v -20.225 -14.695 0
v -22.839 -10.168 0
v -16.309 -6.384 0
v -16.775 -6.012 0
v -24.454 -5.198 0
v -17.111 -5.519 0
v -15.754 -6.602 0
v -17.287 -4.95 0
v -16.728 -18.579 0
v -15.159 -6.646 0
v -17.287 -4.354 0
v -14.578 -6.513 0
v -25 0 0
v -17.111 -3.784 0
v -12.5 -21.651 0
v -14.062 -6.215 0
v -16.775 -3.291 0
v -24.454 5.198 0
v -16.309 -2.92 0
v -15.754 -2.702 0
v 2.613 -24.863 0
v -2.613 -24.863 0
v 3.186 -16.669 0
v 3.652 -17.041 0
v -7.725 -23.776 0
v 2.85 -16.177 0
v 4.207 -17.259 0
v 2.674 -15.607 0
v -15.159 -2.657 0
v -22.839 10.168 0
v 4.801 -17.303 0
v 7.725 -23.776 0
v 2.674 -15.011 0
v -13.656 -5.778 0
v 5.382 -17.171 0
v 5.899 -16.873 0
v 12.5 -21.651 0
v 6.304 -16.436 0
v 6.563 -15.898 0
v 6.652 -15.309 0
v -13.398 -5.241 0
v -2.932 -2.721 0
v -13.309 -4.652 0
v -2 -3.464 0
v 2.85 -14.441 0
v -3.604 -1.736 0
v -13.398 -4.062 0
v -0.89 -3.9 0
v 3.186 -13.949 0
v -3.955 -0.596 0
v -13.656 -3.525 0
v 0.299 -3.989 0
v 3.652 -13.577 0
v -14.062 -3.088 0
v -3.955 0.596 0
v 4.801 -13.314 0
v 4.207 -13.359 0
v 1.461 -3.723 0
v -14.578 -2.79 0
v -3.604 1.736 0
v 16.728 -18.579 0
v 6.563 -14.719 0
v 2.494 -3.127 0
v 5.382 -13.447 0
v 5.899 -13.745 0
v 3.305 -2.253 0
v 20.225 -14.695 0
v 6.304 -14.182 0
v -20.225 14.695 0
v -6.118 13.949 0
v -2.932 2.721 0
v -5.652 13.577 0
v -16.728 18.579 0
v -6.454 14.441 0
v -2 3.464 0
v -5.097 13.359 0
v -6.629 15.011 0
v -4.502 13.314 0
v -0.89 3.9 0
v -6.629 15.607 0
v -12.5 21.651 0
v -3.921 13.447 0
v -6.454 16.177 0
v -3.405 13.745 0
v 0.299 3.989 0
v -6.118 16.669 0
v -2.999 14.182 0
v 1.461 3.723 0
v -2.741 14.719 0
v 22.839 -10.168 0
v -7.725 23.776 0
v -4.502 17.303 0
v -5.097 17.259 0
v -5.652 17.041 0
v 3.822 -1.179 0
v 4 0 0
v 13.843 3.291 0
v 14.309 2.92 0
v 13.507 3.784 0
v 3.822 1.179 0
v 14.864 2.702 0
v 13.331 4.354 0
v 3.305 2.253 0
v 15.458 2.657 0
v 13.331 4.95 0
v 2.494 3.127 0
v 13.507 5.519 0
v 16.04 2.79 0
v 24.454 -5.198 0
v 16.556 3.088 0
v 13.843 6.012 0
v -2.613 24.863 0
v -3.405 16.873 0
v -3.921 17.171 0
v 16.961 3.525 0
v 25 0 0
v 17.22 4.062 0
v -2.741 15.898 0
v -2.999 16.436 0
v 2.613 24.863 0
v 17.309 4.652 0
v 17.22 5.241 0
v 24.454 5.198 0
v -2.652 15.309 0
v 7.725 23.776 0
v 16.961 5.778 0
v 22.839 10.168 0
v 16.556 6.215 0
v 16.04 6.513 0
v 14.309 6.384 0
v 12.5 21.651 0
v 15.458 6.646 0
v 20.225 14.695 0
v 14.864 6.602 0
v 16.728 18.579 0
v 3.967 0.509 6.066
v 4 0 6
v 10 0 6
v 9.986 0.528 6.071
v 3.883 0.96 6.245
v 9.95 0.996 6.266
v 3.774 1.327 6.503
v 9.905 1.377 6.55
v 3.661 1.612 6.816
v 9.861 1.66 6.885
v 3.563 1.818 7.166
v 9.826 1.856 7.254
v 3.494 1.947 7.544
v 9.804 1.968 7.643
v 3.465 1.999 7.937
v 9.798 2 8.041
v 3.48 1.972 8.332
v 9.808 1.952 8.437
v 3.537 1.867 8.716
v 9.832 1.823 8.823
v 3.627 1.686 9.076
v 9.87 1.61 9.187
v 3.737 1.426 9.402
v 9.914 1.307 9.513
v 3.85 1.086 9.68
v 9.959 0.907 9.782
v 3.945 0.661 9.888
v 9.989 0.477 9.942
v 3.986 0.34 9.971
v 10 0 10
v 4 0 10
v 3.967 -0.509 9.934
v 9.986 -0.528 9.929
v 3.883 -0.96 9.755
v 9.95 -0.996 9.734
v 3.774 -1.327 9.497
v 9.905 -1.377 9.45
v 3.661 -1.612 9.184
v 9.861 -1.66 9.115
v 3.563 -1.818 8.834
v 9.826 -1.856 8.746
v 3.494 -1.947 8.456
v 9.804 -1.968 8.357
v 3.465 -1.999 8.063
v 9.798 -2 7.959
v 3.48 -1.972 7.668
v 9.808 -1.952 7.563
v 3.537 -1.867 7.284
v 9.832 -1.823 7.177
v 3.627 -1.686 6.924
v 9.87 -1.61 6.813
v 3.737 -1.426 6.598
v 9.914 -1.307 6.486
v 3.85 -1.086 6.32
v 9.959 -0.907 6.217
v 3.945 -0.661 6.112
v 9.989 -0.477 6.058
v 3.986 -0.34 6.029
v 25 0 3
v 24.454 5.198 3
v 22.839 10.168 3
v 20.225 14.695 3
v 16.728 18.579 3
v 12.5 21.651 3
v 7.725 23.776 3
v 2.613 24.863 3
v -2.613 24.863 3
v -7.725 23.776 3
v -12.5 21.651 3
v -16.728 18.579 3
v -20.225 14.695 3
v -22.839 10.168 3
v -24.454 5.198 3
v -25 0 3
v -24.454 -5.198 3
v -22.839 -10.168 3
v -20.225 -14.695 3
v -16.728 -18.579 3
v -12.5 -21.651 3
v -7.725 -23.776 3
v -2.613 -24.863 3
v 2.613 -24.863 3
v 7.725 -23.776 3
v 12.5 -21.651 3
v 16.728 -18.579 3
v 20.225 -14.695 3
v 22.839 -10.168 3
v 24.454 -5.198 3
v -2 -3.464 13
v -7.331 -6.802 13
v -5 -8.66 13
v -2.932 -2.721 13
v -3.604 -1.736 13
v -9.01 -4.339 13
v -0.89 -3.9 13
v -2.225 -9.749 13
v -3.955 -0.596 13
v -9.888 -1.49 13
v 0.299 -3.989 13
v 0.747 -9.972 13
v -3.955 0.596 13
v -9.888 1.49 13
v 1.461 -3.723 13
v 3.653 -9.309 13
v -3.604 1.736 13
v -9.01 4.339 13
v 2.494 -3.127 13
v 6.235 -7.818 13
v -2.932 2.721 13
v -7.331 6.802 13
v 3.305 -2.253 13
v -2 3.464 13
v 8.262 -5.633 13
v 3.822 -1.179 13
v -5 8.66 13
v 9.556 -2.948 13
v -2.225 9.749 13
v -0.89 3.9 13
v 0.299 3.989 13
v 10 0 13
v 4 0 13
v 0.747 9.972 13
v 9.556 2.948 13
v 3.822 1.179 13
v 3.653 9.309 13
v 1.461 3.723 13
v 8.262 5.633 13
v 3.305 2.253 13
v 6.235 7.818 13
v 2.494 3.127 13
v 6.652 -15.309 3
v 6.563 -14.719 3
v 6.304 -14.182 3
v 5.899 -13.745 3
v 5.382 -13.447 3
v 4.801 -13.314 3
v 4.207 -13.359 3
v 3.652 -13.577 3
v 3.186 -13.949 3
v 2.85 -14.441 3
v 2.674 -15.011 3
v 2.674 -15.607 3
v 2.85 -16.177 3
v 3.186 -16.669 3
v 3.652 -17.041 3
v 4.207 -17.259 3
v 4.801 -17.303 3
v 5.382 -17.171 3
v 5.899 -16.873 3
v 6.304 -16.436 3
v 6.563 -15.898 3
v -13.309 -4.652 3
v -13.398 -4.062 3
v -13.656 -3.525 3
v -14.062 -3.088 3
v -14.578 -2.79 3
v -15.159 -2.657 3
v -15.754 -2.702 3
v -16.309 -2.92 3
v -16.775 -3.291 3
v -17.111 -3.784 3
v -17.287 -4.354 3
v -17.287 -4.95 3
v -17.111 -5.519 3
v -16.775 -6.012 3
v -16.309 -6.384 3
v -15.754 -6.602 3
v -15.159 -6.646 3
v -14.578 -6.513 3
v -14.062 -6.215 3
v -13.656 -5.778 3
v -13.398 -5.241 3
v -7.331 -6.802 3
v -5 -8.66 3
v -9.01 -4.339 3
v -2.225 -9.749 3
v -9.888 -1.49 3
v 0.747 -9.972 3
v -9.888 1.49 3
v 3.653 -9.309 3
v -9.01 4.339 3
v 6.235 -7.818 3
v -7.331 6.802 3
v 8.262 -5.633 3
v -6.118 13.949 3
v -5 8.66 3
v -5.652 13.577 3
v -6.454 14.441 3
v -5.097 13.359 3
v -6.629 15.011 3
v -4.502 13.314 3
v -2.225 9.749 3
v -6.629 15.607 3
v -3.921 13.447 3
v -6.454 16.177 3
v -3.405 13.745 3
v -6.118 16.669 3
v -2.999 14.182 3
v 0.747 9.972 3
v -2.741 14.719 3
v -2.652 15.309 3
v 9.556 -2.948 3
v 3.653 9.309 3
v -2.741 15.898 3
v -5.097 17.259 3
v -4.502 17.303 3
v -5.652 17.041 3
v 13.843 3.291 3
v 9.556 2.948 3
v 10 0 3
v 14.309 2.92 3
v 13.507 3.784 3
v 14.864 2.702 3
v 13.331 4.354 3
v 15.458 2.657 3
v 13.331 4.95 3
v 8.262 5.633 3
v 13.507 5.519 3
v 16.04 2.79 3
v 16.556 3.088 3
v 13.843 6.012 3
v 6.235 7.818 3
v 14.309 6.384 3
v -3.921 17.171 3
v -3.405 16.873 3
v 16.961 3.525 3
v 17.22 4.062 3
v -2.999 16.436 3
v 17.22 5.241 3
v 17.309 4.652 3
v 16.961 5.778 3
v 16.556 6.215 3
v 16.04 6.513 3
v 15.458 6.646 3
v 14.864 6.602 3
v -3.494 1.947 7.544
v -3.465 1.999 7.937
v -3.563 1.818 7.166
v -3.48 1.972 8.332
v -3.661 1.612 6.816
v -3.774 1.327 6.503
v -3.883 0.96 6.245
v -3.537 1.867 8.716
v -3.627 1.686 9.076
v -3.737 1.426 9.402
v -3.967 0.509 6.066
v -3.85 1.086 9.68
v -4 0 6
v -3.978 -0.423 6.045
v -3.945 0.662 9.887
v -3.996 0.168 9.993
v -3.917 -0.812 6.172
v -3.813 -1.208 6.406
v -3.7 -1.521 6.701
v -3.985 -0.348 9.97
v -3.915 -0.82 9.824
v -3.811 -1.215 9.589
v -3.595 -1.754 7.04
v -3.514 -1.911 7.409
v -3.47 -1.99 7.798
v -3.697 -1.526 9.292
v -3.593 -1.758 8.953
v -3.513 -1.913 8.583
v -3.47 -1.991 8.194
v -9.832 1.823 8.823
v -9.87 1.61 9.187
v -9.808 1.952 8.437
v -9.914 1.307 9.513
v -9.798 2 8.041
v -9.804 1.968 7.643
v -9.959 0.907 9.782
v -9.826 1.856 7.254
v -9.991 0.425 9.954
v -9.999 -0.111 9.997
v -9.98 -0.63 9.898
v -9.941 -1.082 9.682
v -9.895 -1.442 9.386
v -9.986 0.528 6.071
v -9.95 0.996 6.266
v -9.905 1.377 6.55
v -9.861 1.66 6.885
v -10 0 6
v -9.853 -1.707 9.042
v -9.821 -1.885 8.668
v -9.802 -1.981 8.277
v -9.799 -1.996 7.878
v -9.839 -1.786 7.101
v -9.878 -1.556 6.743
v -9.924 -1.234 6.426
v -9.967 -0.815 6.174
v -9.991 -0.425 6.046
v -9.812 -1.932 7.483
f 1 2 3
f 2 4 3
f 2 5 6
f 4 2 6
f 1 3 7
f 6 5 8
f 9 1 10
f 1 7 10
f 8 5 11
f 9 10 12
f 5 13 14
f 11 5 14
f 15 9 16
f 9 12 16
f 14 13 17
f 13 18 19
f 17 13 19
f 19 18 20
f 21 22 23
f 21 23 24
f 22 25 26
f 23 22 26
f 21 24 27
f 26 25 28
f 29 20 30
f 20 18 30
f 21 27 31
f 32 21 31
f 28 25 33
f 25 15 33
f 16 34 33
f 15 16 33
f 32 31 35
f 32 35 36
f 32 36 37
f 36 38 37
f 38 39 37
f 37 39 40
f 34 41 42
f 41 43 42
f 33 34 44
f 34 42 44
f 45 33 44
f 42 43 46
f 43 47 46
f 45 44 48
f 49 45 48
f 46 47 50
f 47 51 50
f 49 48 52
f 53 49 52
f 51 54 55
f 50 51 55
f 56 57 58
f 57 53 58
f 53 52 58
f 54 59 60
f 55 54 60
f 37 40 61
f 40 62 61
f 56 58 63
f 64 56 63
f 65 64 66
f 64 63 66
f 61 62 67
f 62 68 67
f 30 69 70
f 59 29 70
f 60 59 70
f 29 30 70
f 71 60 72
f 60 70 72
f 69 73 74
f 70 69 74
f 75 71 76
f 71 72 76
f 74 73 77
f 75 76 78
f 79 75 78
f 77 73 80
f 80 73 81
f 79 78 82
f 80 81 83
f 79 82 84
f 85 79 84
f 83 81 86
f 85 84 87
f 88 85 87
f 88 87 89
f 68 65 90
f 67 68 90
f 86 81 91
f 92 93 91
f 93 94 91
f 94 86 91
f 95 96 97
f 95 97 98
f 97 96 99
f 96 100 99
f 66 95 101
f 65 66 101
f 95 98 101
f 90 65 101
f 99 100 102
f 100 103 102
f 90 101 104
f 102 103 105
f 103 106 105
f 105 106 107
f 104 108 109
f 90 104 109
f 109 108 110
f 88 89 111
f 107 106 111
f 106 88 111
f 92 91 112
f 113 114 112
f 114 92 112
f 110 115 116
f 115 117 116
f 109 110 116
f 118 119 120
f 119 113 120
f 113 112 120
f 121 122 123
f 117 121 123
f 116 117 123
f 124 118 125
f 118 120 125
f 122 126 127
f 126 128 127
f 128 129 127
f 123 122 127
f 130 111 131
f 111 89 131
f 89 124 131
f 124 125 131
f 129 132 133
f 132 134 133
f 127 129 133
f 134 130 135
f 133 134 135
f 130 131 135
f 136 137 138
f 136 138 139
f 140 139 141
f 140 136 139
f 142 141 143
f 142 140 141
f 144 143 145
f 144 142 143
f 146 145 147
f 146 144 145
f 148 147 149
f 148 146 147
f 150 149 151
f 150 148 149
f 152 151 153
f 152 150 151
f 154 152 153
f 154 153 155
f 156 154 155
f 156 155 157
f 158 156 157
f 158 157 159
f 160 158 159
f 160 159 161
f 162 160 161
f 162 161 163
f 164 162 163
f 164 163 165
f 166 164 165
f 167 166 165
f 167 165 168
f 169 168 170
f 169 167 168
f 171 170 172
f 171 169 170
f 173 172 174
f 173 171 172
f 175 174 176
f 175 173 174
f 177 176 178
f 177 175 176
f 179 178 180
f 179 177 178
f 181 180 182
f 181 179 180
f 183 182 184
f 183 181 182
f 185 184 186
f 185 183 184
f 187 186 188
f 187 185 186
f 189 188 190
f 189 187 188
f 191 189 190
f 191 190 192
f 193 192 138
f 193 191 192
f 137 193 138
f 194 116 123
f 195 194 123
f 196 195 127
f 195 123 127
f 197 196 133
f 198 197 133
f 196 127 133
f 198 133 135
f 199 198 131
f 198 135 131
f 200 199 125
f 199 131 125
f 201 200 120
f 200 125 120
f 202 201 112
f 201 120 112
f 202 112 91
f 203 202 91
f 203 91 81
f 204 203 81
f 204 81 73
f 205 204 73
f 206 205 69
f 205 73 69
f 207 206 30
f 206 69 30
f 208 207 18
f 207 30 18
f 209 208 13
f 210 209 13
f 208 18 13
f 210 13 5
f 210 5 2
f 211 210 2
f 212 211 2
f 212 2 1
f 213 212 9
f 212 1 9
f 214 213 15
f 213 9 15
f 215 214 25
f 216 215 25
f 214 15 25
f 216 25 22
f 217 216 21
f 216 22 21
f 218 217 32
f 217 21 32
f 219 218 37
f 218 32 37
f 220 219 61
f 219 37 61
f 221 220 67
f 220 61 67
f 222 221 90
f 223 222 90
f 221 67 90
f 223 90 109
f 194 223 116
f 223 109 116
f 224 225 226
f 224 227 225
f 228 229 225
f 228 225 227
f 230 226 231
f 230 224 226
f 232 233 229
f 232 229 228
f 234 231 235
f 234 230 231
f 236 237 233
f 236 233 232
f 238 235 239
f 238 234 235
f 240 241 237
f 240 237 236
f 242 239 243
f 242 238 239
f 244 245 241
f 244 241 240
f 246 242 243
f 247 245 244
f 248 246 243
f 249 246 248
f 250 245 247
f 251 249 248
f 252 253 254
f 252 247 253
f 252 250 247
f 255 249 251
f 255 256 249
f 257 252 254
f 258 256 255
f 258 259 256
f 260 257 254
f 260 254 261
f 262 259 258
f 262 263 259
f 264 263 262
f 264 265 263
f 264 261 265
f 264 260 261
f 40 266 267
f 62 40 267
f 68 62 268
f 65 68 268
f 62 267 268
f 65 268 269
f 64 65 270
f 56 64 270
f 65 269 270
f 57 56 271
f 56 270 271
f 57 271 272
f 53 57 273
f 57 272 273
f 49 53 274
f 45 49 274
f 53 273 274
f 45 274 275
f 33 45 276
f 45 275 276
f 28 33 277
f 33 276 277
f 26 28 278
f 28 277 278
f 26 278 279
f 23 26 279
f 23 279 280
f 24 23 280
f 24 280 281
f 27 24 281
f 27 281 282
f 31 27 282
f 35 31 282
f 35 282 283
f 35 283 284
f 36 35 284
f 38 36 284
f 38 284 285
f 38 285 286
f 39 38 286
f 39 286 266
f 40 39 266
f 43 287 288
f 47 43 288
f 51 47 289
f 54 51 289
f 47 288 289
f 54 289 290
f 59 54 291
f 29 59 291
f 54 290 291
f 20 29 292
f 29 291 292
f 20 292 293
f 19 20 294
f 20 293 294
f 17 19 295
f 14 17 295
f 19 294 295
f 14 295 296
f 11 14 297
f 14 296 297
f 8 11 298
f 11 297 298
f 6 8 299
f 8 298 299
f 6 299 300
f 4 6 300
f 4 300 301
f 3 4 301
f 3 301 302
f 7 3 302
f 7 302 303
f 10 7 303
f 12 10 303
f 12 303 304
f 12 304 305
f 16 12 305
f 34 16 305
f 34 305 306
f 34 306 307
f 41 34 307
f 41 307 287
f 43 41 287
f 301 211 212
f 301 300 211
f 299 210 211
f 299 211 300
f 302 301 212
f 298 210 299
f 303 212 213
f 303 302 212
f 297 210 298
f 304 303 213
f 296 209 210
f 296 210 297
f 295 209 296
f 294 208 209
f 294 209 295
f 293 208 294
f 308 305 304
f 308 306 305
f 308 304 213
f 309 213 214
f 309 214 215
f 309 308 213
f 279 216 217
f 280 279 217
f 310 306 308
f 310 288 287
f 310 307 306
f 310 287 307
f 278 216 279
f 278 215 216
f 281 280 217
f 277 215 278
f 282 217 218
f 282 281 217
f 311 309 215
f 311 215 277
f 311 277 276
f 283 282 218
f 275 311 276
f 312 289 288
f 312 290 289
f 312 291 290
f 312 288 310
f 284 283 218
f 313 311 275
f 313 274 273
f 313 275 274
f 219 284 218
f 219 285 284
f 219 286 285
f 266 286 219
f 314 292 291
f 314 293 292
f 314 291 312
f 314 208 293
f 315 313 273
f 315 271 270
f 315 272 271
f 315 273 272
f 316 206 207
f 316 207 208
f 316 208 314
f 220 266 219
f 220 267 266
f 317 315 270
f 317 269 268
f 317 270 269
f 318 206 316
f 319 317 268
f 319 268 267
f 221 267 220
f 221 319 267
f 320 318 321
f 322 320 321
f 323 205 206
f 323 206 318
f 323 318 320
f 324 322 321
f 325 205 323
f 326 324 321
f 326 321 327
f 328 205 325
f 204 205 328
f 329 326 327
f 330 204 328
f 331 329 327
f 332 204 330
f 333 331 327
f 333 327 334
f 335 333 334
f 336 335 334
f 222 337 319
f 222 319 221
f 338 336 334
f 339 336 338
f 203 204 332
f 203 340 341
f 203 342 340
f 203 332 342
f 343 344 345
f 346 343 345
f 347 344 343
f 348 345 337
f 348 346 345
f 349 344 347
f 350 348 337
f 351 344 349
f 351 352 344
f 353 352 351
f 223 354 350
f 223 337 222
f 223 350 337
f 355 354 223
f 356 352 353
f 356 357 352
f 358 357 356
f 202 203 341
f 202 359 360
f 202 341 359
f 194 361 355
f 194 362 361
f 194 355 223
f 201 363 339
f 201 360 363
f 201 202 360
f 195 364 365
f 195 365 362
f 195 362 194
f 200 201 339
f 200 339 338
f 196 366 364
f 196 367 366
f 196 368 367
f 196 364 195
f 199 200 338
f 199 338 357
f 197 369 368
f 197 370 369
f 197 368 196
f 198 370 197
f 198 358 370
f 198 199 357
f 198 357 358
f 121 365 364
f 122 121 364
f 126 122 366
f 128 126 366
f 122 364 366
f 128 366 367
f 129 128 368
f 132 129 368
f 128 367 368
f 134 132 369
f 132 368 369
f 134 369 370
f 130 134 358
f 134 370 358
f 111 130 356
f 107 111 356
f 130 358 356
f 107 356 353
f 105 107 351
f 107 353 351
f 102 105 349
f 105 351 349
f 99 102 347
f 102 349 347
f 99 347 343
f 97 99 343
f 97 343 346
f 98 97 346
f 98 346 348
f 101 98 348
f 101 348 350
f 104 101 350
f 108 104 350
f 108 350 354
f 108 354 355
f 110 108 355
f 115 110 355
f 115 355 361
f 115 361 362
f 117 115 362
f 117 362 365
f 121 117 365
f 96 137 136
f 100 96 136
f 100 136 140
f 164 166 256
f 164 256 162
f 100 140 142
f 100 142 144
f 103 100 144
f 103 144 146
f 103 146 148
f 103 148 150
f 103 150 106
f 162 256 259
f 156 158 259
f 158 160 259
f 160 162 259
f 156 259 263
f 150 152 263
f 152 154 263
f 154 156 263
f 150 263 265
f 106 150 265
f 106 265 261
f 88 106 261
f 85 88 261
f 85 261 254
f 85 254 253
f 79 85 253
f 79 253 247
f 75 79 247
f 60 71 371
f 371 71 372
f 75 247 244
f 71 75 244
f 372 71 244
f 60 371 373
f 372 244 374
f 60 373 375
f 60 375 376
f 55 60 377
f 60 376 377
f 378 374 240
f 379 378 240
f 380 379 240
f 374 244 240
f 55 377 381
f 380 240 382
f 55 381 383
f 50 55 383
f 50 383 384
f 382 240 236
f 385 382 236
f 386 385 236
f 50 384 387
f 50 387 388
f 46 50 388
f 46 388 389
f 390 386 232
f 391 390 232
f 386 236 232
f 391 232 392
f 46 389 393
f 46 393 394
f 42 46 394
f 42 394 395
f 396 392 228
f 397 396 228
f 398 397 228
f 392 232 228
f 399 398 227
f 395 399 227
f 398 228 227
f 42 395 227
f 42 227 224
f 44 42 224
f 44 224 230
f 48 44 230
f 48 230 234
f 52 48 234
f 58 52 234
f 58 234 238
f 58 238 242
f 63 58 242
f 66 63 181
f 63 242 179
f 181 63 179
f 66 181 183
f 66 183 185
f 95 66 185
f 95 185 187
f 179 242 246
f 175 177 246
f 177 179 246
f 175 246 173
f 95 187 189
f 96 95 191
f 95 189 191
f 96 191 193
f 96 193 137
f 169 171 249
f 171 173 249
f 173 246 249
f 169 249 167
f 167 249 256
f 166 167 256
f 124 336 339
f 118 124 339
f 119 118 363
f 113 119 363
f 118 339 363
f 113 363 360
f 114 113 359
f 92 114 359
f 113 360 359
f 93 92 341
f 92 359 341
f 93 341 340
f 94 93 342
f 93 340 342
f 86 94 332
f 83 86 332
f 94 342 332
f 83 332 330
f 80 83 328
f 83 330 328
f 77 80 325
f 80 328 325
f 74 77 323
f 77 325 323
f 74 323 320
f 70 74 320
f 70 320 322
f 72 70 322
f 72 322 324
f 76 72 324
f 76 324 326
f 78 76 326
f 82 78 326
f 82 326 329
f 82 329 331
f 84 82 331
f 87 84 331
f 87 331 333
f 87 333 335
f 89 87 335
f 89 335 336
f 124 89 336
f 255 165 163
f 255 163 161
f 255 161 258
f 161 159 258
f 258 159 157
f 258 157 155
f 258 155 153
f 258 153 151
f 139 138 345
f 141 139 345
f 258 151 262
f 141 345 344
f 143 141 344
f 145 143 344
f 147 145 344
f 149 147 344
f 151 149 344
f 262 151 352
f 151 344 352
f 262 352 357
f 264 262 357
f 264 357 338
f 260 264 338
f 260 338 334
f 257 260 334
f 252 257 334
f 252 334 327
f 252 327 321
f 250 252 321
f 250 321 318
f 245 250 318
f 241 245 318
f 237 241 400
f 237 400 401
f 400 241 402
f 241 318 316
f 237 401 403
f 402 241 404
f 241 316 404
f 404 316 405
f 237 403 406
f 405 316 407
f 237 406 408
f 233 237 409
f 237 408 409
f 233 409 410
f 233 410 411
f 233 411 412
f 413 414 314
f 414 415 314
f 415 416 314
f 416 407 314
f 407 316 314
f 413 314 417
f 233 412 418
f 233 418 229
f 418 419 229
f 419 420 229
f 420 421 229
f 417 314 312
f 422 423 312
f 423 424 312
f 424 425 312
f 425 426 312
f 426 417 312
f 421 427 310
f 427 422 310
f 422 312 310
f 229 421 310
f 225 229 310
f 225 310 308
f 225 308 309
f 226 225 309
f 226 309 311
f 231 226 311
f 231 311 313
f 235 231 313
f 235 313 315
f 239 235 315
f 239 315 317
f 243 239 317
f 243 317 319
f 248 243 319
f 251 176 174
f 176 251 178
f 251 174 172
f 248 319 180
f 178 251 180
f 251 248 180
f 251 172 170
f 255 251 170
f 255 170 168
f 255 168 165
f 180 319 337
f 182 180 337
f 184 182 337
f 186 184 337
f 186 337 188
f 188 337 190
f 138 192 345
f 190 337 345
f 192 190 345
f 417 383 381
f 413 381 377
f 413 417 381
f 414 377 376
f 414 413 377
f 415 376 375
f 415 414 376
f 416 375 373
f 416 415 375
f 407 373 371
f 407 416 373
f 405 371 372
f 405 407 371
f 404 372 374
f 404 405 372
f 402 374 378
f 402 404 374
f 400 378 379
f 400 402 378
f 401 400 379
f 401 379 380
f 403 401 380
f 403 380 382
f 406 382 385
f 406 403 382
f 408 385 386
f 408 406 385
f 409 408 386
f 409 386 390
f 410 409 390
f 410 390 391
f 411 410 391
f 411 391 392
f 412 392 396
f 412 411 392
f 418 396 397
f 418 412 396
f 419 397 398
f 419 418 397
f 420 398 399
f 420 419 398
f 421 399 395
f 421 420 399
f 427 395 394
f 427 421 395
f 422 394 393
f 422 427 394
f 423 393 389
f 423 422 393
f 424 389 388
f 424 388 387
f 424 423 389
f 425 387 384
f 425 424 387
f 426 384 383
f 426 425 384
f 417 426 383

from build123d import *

# Parameters (mm, degrees)
CROQUIS1_R                 = 25
SALIENTE_EXTRUIR1_DEPTH    = 3
CROQUIS2_R                 = 10
SALIENTE_EXTRUIR2_DEPTH    = 10
CROQUIS3_R                 = 4
CORTAR_EXTRUIR1_DEPTH      = 38.669616404
CROQUIS4_R                 = 2
CORTAR_EXTRUIR2_DEPTH      = 37.742346142
CORTAR_EXTRUIR3_DEPTH      = 38.669616404
CORTAR_EXTRUIR3_DEPTH_BACK = 38.669616404
CROQUIS5_R                 = 2


with BuildPart() as part:
    # Croquis1 → Saliente-Extruir1 (new body)
    with BuildSketch(Plane.XY):
        Circle(CROQUIS1_R)
    extrude(amount=SALIENTE_EXTRUIR1_DEPTH)

    # Croquis2 → Saliente-Extruir2 (add)
    with BuildSketch(Plane.XY.offset(3)):
        Circle(CROQUIS2_R)
    extrude(amount=SALIENTE_EXTRUIR2_DEPTH)

    # Croquis3 → Cortar-Extruir1 (cut, through all)
    with BuildSketch(Plane.XY.offset(13)):
        Circle(CROQUIS3_R)
    extrude(amount=-CORTAR_EXTRUIR1_DEPTH, mode=Mode.SUBTRACT)

    # Croquis4 → Cortar-Extruir2 (cut, through all)
    with BuildSketch(Plane.XY.offset(3)):
        with Locations((-4.65167861, 15.308882589)):
            Circle(CROQUIS4_R)
        with Locations((15.308882589, 4.65167861)):
            Circle(CROQUIS4_R)
        with Locations((4.65167861, -15.308882589)):
            Circle(CROQUIS4_R)
        with Locations((-15.308882589, -4.65167861)):
            Circle(CROQUIS4_R)
    extrude(amount=-CORTAR_EXTRUIR2_DEPTH, mode=Mode.SUBTRACT)

    # Croquis5 → Cortar-Extruir3 (cut, two sides: drawn at the far end of the back side and taken through both)
    with BuildSketch(Plane(origin=(0, 0, 0), x_dir=(0, 0, -1), z_dir=(1, 0, 0)).offset(-CORTAR_EXTRUIR3_DEPTH_BACK)):
        with Locations((-8, 0)):
            Circle(CROQUIS5_R)
    extrude(amount=CORTAR_EXTRUIR3_DEPTH + CORTAR_EXTRUIR3_DEPTH_BACK, mode=Mode.SUBTRACT)


solid = part.part
